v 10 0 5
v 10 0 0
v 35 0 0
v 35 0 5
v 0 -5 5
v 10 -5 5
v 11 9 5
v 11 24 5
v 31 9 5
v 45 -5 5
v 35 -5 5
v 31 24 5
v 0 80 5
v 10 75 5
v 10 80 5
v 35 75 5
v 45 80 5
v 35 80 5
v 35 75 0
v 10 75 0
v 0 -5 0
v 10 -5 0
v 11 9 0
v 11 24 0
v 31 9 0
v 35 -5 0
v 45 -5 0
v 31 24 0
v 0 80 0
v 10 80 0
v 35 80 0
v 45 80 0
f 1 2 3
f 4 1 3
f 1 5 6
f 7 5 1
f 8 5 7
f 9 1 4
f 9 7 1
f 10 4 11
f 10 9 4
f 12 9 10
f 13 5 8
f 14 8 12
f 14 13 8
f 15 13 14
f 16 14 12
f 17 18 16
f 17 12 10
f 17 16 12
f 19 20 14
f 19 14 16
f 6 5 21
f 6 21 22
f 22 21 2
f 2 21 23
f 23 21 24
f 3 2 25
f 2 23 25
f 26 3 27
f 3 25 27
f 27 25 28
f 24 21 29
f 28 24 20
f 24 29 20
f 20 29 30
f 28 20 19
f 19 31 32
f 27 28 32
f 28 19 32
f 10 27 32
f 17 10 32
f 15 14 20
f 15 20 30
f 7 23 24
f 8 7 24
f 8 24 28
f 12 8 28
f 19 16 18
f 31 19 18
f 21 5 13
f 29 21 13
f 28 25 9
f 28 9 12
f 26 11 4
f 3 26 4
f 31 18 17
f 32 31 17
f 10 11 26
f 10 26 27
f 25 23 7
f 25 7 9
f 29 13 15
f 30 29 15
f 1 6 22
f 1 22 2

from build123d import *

# Parameters (mm, degrees)
ESQUISSE1_W        = 45
ESQUISSE1_H        = 75
ESQUISSE1_W_2      = 20
ESQUISSE1_H_2      = 15
BOSS_EXTRU_1_DEPTH = 5
ESQUISSE2_W        = 10
ESQUISSE2_H        = 5
BOSS_EXTRU_2_DEPTH = 5


with BuildPart() as part:
    # Esquisse1 → Boss.-Extru.1 (new body)
    with BuildSketch(Plane.XY):
        with Locations((22.5, 37.5)):
            Rectangle(ESQUISSE1_W, ESQUISSE1_H)
        with Locations((21, 16.5)):
            Rectangle(ESQUISSE1_W_2, ESQUISSE1_H_2, mode=Mode.SUBTRACT)
    extrude(amount=BOSS_EXTRU_1_DEPTH)

    # Esquisse2 → Boss.-Extru.2 (add)
    with BuildSketch(Plane.XY.offset(5)):
        with Locations((5, 77.5)):
            Rectangle(ESQUISSE2_W, ESQUISSE2_H)
        with Locations((40, 77.5)):
            Rectangle(ESQUISSE2_W, ESQUISSE2_H)
        with Locations((5, -2.5)):
            Rectangle(ESQUISSE2_W, ESQUISSE2_H)
        with Locations((40, -2.5)):
            Rectangle(ESQUISSE2_W, ESQUISSE2_H)
    extrude(amount=-BOSS_EXTRU_2_DEPTH)


solid = part.part
